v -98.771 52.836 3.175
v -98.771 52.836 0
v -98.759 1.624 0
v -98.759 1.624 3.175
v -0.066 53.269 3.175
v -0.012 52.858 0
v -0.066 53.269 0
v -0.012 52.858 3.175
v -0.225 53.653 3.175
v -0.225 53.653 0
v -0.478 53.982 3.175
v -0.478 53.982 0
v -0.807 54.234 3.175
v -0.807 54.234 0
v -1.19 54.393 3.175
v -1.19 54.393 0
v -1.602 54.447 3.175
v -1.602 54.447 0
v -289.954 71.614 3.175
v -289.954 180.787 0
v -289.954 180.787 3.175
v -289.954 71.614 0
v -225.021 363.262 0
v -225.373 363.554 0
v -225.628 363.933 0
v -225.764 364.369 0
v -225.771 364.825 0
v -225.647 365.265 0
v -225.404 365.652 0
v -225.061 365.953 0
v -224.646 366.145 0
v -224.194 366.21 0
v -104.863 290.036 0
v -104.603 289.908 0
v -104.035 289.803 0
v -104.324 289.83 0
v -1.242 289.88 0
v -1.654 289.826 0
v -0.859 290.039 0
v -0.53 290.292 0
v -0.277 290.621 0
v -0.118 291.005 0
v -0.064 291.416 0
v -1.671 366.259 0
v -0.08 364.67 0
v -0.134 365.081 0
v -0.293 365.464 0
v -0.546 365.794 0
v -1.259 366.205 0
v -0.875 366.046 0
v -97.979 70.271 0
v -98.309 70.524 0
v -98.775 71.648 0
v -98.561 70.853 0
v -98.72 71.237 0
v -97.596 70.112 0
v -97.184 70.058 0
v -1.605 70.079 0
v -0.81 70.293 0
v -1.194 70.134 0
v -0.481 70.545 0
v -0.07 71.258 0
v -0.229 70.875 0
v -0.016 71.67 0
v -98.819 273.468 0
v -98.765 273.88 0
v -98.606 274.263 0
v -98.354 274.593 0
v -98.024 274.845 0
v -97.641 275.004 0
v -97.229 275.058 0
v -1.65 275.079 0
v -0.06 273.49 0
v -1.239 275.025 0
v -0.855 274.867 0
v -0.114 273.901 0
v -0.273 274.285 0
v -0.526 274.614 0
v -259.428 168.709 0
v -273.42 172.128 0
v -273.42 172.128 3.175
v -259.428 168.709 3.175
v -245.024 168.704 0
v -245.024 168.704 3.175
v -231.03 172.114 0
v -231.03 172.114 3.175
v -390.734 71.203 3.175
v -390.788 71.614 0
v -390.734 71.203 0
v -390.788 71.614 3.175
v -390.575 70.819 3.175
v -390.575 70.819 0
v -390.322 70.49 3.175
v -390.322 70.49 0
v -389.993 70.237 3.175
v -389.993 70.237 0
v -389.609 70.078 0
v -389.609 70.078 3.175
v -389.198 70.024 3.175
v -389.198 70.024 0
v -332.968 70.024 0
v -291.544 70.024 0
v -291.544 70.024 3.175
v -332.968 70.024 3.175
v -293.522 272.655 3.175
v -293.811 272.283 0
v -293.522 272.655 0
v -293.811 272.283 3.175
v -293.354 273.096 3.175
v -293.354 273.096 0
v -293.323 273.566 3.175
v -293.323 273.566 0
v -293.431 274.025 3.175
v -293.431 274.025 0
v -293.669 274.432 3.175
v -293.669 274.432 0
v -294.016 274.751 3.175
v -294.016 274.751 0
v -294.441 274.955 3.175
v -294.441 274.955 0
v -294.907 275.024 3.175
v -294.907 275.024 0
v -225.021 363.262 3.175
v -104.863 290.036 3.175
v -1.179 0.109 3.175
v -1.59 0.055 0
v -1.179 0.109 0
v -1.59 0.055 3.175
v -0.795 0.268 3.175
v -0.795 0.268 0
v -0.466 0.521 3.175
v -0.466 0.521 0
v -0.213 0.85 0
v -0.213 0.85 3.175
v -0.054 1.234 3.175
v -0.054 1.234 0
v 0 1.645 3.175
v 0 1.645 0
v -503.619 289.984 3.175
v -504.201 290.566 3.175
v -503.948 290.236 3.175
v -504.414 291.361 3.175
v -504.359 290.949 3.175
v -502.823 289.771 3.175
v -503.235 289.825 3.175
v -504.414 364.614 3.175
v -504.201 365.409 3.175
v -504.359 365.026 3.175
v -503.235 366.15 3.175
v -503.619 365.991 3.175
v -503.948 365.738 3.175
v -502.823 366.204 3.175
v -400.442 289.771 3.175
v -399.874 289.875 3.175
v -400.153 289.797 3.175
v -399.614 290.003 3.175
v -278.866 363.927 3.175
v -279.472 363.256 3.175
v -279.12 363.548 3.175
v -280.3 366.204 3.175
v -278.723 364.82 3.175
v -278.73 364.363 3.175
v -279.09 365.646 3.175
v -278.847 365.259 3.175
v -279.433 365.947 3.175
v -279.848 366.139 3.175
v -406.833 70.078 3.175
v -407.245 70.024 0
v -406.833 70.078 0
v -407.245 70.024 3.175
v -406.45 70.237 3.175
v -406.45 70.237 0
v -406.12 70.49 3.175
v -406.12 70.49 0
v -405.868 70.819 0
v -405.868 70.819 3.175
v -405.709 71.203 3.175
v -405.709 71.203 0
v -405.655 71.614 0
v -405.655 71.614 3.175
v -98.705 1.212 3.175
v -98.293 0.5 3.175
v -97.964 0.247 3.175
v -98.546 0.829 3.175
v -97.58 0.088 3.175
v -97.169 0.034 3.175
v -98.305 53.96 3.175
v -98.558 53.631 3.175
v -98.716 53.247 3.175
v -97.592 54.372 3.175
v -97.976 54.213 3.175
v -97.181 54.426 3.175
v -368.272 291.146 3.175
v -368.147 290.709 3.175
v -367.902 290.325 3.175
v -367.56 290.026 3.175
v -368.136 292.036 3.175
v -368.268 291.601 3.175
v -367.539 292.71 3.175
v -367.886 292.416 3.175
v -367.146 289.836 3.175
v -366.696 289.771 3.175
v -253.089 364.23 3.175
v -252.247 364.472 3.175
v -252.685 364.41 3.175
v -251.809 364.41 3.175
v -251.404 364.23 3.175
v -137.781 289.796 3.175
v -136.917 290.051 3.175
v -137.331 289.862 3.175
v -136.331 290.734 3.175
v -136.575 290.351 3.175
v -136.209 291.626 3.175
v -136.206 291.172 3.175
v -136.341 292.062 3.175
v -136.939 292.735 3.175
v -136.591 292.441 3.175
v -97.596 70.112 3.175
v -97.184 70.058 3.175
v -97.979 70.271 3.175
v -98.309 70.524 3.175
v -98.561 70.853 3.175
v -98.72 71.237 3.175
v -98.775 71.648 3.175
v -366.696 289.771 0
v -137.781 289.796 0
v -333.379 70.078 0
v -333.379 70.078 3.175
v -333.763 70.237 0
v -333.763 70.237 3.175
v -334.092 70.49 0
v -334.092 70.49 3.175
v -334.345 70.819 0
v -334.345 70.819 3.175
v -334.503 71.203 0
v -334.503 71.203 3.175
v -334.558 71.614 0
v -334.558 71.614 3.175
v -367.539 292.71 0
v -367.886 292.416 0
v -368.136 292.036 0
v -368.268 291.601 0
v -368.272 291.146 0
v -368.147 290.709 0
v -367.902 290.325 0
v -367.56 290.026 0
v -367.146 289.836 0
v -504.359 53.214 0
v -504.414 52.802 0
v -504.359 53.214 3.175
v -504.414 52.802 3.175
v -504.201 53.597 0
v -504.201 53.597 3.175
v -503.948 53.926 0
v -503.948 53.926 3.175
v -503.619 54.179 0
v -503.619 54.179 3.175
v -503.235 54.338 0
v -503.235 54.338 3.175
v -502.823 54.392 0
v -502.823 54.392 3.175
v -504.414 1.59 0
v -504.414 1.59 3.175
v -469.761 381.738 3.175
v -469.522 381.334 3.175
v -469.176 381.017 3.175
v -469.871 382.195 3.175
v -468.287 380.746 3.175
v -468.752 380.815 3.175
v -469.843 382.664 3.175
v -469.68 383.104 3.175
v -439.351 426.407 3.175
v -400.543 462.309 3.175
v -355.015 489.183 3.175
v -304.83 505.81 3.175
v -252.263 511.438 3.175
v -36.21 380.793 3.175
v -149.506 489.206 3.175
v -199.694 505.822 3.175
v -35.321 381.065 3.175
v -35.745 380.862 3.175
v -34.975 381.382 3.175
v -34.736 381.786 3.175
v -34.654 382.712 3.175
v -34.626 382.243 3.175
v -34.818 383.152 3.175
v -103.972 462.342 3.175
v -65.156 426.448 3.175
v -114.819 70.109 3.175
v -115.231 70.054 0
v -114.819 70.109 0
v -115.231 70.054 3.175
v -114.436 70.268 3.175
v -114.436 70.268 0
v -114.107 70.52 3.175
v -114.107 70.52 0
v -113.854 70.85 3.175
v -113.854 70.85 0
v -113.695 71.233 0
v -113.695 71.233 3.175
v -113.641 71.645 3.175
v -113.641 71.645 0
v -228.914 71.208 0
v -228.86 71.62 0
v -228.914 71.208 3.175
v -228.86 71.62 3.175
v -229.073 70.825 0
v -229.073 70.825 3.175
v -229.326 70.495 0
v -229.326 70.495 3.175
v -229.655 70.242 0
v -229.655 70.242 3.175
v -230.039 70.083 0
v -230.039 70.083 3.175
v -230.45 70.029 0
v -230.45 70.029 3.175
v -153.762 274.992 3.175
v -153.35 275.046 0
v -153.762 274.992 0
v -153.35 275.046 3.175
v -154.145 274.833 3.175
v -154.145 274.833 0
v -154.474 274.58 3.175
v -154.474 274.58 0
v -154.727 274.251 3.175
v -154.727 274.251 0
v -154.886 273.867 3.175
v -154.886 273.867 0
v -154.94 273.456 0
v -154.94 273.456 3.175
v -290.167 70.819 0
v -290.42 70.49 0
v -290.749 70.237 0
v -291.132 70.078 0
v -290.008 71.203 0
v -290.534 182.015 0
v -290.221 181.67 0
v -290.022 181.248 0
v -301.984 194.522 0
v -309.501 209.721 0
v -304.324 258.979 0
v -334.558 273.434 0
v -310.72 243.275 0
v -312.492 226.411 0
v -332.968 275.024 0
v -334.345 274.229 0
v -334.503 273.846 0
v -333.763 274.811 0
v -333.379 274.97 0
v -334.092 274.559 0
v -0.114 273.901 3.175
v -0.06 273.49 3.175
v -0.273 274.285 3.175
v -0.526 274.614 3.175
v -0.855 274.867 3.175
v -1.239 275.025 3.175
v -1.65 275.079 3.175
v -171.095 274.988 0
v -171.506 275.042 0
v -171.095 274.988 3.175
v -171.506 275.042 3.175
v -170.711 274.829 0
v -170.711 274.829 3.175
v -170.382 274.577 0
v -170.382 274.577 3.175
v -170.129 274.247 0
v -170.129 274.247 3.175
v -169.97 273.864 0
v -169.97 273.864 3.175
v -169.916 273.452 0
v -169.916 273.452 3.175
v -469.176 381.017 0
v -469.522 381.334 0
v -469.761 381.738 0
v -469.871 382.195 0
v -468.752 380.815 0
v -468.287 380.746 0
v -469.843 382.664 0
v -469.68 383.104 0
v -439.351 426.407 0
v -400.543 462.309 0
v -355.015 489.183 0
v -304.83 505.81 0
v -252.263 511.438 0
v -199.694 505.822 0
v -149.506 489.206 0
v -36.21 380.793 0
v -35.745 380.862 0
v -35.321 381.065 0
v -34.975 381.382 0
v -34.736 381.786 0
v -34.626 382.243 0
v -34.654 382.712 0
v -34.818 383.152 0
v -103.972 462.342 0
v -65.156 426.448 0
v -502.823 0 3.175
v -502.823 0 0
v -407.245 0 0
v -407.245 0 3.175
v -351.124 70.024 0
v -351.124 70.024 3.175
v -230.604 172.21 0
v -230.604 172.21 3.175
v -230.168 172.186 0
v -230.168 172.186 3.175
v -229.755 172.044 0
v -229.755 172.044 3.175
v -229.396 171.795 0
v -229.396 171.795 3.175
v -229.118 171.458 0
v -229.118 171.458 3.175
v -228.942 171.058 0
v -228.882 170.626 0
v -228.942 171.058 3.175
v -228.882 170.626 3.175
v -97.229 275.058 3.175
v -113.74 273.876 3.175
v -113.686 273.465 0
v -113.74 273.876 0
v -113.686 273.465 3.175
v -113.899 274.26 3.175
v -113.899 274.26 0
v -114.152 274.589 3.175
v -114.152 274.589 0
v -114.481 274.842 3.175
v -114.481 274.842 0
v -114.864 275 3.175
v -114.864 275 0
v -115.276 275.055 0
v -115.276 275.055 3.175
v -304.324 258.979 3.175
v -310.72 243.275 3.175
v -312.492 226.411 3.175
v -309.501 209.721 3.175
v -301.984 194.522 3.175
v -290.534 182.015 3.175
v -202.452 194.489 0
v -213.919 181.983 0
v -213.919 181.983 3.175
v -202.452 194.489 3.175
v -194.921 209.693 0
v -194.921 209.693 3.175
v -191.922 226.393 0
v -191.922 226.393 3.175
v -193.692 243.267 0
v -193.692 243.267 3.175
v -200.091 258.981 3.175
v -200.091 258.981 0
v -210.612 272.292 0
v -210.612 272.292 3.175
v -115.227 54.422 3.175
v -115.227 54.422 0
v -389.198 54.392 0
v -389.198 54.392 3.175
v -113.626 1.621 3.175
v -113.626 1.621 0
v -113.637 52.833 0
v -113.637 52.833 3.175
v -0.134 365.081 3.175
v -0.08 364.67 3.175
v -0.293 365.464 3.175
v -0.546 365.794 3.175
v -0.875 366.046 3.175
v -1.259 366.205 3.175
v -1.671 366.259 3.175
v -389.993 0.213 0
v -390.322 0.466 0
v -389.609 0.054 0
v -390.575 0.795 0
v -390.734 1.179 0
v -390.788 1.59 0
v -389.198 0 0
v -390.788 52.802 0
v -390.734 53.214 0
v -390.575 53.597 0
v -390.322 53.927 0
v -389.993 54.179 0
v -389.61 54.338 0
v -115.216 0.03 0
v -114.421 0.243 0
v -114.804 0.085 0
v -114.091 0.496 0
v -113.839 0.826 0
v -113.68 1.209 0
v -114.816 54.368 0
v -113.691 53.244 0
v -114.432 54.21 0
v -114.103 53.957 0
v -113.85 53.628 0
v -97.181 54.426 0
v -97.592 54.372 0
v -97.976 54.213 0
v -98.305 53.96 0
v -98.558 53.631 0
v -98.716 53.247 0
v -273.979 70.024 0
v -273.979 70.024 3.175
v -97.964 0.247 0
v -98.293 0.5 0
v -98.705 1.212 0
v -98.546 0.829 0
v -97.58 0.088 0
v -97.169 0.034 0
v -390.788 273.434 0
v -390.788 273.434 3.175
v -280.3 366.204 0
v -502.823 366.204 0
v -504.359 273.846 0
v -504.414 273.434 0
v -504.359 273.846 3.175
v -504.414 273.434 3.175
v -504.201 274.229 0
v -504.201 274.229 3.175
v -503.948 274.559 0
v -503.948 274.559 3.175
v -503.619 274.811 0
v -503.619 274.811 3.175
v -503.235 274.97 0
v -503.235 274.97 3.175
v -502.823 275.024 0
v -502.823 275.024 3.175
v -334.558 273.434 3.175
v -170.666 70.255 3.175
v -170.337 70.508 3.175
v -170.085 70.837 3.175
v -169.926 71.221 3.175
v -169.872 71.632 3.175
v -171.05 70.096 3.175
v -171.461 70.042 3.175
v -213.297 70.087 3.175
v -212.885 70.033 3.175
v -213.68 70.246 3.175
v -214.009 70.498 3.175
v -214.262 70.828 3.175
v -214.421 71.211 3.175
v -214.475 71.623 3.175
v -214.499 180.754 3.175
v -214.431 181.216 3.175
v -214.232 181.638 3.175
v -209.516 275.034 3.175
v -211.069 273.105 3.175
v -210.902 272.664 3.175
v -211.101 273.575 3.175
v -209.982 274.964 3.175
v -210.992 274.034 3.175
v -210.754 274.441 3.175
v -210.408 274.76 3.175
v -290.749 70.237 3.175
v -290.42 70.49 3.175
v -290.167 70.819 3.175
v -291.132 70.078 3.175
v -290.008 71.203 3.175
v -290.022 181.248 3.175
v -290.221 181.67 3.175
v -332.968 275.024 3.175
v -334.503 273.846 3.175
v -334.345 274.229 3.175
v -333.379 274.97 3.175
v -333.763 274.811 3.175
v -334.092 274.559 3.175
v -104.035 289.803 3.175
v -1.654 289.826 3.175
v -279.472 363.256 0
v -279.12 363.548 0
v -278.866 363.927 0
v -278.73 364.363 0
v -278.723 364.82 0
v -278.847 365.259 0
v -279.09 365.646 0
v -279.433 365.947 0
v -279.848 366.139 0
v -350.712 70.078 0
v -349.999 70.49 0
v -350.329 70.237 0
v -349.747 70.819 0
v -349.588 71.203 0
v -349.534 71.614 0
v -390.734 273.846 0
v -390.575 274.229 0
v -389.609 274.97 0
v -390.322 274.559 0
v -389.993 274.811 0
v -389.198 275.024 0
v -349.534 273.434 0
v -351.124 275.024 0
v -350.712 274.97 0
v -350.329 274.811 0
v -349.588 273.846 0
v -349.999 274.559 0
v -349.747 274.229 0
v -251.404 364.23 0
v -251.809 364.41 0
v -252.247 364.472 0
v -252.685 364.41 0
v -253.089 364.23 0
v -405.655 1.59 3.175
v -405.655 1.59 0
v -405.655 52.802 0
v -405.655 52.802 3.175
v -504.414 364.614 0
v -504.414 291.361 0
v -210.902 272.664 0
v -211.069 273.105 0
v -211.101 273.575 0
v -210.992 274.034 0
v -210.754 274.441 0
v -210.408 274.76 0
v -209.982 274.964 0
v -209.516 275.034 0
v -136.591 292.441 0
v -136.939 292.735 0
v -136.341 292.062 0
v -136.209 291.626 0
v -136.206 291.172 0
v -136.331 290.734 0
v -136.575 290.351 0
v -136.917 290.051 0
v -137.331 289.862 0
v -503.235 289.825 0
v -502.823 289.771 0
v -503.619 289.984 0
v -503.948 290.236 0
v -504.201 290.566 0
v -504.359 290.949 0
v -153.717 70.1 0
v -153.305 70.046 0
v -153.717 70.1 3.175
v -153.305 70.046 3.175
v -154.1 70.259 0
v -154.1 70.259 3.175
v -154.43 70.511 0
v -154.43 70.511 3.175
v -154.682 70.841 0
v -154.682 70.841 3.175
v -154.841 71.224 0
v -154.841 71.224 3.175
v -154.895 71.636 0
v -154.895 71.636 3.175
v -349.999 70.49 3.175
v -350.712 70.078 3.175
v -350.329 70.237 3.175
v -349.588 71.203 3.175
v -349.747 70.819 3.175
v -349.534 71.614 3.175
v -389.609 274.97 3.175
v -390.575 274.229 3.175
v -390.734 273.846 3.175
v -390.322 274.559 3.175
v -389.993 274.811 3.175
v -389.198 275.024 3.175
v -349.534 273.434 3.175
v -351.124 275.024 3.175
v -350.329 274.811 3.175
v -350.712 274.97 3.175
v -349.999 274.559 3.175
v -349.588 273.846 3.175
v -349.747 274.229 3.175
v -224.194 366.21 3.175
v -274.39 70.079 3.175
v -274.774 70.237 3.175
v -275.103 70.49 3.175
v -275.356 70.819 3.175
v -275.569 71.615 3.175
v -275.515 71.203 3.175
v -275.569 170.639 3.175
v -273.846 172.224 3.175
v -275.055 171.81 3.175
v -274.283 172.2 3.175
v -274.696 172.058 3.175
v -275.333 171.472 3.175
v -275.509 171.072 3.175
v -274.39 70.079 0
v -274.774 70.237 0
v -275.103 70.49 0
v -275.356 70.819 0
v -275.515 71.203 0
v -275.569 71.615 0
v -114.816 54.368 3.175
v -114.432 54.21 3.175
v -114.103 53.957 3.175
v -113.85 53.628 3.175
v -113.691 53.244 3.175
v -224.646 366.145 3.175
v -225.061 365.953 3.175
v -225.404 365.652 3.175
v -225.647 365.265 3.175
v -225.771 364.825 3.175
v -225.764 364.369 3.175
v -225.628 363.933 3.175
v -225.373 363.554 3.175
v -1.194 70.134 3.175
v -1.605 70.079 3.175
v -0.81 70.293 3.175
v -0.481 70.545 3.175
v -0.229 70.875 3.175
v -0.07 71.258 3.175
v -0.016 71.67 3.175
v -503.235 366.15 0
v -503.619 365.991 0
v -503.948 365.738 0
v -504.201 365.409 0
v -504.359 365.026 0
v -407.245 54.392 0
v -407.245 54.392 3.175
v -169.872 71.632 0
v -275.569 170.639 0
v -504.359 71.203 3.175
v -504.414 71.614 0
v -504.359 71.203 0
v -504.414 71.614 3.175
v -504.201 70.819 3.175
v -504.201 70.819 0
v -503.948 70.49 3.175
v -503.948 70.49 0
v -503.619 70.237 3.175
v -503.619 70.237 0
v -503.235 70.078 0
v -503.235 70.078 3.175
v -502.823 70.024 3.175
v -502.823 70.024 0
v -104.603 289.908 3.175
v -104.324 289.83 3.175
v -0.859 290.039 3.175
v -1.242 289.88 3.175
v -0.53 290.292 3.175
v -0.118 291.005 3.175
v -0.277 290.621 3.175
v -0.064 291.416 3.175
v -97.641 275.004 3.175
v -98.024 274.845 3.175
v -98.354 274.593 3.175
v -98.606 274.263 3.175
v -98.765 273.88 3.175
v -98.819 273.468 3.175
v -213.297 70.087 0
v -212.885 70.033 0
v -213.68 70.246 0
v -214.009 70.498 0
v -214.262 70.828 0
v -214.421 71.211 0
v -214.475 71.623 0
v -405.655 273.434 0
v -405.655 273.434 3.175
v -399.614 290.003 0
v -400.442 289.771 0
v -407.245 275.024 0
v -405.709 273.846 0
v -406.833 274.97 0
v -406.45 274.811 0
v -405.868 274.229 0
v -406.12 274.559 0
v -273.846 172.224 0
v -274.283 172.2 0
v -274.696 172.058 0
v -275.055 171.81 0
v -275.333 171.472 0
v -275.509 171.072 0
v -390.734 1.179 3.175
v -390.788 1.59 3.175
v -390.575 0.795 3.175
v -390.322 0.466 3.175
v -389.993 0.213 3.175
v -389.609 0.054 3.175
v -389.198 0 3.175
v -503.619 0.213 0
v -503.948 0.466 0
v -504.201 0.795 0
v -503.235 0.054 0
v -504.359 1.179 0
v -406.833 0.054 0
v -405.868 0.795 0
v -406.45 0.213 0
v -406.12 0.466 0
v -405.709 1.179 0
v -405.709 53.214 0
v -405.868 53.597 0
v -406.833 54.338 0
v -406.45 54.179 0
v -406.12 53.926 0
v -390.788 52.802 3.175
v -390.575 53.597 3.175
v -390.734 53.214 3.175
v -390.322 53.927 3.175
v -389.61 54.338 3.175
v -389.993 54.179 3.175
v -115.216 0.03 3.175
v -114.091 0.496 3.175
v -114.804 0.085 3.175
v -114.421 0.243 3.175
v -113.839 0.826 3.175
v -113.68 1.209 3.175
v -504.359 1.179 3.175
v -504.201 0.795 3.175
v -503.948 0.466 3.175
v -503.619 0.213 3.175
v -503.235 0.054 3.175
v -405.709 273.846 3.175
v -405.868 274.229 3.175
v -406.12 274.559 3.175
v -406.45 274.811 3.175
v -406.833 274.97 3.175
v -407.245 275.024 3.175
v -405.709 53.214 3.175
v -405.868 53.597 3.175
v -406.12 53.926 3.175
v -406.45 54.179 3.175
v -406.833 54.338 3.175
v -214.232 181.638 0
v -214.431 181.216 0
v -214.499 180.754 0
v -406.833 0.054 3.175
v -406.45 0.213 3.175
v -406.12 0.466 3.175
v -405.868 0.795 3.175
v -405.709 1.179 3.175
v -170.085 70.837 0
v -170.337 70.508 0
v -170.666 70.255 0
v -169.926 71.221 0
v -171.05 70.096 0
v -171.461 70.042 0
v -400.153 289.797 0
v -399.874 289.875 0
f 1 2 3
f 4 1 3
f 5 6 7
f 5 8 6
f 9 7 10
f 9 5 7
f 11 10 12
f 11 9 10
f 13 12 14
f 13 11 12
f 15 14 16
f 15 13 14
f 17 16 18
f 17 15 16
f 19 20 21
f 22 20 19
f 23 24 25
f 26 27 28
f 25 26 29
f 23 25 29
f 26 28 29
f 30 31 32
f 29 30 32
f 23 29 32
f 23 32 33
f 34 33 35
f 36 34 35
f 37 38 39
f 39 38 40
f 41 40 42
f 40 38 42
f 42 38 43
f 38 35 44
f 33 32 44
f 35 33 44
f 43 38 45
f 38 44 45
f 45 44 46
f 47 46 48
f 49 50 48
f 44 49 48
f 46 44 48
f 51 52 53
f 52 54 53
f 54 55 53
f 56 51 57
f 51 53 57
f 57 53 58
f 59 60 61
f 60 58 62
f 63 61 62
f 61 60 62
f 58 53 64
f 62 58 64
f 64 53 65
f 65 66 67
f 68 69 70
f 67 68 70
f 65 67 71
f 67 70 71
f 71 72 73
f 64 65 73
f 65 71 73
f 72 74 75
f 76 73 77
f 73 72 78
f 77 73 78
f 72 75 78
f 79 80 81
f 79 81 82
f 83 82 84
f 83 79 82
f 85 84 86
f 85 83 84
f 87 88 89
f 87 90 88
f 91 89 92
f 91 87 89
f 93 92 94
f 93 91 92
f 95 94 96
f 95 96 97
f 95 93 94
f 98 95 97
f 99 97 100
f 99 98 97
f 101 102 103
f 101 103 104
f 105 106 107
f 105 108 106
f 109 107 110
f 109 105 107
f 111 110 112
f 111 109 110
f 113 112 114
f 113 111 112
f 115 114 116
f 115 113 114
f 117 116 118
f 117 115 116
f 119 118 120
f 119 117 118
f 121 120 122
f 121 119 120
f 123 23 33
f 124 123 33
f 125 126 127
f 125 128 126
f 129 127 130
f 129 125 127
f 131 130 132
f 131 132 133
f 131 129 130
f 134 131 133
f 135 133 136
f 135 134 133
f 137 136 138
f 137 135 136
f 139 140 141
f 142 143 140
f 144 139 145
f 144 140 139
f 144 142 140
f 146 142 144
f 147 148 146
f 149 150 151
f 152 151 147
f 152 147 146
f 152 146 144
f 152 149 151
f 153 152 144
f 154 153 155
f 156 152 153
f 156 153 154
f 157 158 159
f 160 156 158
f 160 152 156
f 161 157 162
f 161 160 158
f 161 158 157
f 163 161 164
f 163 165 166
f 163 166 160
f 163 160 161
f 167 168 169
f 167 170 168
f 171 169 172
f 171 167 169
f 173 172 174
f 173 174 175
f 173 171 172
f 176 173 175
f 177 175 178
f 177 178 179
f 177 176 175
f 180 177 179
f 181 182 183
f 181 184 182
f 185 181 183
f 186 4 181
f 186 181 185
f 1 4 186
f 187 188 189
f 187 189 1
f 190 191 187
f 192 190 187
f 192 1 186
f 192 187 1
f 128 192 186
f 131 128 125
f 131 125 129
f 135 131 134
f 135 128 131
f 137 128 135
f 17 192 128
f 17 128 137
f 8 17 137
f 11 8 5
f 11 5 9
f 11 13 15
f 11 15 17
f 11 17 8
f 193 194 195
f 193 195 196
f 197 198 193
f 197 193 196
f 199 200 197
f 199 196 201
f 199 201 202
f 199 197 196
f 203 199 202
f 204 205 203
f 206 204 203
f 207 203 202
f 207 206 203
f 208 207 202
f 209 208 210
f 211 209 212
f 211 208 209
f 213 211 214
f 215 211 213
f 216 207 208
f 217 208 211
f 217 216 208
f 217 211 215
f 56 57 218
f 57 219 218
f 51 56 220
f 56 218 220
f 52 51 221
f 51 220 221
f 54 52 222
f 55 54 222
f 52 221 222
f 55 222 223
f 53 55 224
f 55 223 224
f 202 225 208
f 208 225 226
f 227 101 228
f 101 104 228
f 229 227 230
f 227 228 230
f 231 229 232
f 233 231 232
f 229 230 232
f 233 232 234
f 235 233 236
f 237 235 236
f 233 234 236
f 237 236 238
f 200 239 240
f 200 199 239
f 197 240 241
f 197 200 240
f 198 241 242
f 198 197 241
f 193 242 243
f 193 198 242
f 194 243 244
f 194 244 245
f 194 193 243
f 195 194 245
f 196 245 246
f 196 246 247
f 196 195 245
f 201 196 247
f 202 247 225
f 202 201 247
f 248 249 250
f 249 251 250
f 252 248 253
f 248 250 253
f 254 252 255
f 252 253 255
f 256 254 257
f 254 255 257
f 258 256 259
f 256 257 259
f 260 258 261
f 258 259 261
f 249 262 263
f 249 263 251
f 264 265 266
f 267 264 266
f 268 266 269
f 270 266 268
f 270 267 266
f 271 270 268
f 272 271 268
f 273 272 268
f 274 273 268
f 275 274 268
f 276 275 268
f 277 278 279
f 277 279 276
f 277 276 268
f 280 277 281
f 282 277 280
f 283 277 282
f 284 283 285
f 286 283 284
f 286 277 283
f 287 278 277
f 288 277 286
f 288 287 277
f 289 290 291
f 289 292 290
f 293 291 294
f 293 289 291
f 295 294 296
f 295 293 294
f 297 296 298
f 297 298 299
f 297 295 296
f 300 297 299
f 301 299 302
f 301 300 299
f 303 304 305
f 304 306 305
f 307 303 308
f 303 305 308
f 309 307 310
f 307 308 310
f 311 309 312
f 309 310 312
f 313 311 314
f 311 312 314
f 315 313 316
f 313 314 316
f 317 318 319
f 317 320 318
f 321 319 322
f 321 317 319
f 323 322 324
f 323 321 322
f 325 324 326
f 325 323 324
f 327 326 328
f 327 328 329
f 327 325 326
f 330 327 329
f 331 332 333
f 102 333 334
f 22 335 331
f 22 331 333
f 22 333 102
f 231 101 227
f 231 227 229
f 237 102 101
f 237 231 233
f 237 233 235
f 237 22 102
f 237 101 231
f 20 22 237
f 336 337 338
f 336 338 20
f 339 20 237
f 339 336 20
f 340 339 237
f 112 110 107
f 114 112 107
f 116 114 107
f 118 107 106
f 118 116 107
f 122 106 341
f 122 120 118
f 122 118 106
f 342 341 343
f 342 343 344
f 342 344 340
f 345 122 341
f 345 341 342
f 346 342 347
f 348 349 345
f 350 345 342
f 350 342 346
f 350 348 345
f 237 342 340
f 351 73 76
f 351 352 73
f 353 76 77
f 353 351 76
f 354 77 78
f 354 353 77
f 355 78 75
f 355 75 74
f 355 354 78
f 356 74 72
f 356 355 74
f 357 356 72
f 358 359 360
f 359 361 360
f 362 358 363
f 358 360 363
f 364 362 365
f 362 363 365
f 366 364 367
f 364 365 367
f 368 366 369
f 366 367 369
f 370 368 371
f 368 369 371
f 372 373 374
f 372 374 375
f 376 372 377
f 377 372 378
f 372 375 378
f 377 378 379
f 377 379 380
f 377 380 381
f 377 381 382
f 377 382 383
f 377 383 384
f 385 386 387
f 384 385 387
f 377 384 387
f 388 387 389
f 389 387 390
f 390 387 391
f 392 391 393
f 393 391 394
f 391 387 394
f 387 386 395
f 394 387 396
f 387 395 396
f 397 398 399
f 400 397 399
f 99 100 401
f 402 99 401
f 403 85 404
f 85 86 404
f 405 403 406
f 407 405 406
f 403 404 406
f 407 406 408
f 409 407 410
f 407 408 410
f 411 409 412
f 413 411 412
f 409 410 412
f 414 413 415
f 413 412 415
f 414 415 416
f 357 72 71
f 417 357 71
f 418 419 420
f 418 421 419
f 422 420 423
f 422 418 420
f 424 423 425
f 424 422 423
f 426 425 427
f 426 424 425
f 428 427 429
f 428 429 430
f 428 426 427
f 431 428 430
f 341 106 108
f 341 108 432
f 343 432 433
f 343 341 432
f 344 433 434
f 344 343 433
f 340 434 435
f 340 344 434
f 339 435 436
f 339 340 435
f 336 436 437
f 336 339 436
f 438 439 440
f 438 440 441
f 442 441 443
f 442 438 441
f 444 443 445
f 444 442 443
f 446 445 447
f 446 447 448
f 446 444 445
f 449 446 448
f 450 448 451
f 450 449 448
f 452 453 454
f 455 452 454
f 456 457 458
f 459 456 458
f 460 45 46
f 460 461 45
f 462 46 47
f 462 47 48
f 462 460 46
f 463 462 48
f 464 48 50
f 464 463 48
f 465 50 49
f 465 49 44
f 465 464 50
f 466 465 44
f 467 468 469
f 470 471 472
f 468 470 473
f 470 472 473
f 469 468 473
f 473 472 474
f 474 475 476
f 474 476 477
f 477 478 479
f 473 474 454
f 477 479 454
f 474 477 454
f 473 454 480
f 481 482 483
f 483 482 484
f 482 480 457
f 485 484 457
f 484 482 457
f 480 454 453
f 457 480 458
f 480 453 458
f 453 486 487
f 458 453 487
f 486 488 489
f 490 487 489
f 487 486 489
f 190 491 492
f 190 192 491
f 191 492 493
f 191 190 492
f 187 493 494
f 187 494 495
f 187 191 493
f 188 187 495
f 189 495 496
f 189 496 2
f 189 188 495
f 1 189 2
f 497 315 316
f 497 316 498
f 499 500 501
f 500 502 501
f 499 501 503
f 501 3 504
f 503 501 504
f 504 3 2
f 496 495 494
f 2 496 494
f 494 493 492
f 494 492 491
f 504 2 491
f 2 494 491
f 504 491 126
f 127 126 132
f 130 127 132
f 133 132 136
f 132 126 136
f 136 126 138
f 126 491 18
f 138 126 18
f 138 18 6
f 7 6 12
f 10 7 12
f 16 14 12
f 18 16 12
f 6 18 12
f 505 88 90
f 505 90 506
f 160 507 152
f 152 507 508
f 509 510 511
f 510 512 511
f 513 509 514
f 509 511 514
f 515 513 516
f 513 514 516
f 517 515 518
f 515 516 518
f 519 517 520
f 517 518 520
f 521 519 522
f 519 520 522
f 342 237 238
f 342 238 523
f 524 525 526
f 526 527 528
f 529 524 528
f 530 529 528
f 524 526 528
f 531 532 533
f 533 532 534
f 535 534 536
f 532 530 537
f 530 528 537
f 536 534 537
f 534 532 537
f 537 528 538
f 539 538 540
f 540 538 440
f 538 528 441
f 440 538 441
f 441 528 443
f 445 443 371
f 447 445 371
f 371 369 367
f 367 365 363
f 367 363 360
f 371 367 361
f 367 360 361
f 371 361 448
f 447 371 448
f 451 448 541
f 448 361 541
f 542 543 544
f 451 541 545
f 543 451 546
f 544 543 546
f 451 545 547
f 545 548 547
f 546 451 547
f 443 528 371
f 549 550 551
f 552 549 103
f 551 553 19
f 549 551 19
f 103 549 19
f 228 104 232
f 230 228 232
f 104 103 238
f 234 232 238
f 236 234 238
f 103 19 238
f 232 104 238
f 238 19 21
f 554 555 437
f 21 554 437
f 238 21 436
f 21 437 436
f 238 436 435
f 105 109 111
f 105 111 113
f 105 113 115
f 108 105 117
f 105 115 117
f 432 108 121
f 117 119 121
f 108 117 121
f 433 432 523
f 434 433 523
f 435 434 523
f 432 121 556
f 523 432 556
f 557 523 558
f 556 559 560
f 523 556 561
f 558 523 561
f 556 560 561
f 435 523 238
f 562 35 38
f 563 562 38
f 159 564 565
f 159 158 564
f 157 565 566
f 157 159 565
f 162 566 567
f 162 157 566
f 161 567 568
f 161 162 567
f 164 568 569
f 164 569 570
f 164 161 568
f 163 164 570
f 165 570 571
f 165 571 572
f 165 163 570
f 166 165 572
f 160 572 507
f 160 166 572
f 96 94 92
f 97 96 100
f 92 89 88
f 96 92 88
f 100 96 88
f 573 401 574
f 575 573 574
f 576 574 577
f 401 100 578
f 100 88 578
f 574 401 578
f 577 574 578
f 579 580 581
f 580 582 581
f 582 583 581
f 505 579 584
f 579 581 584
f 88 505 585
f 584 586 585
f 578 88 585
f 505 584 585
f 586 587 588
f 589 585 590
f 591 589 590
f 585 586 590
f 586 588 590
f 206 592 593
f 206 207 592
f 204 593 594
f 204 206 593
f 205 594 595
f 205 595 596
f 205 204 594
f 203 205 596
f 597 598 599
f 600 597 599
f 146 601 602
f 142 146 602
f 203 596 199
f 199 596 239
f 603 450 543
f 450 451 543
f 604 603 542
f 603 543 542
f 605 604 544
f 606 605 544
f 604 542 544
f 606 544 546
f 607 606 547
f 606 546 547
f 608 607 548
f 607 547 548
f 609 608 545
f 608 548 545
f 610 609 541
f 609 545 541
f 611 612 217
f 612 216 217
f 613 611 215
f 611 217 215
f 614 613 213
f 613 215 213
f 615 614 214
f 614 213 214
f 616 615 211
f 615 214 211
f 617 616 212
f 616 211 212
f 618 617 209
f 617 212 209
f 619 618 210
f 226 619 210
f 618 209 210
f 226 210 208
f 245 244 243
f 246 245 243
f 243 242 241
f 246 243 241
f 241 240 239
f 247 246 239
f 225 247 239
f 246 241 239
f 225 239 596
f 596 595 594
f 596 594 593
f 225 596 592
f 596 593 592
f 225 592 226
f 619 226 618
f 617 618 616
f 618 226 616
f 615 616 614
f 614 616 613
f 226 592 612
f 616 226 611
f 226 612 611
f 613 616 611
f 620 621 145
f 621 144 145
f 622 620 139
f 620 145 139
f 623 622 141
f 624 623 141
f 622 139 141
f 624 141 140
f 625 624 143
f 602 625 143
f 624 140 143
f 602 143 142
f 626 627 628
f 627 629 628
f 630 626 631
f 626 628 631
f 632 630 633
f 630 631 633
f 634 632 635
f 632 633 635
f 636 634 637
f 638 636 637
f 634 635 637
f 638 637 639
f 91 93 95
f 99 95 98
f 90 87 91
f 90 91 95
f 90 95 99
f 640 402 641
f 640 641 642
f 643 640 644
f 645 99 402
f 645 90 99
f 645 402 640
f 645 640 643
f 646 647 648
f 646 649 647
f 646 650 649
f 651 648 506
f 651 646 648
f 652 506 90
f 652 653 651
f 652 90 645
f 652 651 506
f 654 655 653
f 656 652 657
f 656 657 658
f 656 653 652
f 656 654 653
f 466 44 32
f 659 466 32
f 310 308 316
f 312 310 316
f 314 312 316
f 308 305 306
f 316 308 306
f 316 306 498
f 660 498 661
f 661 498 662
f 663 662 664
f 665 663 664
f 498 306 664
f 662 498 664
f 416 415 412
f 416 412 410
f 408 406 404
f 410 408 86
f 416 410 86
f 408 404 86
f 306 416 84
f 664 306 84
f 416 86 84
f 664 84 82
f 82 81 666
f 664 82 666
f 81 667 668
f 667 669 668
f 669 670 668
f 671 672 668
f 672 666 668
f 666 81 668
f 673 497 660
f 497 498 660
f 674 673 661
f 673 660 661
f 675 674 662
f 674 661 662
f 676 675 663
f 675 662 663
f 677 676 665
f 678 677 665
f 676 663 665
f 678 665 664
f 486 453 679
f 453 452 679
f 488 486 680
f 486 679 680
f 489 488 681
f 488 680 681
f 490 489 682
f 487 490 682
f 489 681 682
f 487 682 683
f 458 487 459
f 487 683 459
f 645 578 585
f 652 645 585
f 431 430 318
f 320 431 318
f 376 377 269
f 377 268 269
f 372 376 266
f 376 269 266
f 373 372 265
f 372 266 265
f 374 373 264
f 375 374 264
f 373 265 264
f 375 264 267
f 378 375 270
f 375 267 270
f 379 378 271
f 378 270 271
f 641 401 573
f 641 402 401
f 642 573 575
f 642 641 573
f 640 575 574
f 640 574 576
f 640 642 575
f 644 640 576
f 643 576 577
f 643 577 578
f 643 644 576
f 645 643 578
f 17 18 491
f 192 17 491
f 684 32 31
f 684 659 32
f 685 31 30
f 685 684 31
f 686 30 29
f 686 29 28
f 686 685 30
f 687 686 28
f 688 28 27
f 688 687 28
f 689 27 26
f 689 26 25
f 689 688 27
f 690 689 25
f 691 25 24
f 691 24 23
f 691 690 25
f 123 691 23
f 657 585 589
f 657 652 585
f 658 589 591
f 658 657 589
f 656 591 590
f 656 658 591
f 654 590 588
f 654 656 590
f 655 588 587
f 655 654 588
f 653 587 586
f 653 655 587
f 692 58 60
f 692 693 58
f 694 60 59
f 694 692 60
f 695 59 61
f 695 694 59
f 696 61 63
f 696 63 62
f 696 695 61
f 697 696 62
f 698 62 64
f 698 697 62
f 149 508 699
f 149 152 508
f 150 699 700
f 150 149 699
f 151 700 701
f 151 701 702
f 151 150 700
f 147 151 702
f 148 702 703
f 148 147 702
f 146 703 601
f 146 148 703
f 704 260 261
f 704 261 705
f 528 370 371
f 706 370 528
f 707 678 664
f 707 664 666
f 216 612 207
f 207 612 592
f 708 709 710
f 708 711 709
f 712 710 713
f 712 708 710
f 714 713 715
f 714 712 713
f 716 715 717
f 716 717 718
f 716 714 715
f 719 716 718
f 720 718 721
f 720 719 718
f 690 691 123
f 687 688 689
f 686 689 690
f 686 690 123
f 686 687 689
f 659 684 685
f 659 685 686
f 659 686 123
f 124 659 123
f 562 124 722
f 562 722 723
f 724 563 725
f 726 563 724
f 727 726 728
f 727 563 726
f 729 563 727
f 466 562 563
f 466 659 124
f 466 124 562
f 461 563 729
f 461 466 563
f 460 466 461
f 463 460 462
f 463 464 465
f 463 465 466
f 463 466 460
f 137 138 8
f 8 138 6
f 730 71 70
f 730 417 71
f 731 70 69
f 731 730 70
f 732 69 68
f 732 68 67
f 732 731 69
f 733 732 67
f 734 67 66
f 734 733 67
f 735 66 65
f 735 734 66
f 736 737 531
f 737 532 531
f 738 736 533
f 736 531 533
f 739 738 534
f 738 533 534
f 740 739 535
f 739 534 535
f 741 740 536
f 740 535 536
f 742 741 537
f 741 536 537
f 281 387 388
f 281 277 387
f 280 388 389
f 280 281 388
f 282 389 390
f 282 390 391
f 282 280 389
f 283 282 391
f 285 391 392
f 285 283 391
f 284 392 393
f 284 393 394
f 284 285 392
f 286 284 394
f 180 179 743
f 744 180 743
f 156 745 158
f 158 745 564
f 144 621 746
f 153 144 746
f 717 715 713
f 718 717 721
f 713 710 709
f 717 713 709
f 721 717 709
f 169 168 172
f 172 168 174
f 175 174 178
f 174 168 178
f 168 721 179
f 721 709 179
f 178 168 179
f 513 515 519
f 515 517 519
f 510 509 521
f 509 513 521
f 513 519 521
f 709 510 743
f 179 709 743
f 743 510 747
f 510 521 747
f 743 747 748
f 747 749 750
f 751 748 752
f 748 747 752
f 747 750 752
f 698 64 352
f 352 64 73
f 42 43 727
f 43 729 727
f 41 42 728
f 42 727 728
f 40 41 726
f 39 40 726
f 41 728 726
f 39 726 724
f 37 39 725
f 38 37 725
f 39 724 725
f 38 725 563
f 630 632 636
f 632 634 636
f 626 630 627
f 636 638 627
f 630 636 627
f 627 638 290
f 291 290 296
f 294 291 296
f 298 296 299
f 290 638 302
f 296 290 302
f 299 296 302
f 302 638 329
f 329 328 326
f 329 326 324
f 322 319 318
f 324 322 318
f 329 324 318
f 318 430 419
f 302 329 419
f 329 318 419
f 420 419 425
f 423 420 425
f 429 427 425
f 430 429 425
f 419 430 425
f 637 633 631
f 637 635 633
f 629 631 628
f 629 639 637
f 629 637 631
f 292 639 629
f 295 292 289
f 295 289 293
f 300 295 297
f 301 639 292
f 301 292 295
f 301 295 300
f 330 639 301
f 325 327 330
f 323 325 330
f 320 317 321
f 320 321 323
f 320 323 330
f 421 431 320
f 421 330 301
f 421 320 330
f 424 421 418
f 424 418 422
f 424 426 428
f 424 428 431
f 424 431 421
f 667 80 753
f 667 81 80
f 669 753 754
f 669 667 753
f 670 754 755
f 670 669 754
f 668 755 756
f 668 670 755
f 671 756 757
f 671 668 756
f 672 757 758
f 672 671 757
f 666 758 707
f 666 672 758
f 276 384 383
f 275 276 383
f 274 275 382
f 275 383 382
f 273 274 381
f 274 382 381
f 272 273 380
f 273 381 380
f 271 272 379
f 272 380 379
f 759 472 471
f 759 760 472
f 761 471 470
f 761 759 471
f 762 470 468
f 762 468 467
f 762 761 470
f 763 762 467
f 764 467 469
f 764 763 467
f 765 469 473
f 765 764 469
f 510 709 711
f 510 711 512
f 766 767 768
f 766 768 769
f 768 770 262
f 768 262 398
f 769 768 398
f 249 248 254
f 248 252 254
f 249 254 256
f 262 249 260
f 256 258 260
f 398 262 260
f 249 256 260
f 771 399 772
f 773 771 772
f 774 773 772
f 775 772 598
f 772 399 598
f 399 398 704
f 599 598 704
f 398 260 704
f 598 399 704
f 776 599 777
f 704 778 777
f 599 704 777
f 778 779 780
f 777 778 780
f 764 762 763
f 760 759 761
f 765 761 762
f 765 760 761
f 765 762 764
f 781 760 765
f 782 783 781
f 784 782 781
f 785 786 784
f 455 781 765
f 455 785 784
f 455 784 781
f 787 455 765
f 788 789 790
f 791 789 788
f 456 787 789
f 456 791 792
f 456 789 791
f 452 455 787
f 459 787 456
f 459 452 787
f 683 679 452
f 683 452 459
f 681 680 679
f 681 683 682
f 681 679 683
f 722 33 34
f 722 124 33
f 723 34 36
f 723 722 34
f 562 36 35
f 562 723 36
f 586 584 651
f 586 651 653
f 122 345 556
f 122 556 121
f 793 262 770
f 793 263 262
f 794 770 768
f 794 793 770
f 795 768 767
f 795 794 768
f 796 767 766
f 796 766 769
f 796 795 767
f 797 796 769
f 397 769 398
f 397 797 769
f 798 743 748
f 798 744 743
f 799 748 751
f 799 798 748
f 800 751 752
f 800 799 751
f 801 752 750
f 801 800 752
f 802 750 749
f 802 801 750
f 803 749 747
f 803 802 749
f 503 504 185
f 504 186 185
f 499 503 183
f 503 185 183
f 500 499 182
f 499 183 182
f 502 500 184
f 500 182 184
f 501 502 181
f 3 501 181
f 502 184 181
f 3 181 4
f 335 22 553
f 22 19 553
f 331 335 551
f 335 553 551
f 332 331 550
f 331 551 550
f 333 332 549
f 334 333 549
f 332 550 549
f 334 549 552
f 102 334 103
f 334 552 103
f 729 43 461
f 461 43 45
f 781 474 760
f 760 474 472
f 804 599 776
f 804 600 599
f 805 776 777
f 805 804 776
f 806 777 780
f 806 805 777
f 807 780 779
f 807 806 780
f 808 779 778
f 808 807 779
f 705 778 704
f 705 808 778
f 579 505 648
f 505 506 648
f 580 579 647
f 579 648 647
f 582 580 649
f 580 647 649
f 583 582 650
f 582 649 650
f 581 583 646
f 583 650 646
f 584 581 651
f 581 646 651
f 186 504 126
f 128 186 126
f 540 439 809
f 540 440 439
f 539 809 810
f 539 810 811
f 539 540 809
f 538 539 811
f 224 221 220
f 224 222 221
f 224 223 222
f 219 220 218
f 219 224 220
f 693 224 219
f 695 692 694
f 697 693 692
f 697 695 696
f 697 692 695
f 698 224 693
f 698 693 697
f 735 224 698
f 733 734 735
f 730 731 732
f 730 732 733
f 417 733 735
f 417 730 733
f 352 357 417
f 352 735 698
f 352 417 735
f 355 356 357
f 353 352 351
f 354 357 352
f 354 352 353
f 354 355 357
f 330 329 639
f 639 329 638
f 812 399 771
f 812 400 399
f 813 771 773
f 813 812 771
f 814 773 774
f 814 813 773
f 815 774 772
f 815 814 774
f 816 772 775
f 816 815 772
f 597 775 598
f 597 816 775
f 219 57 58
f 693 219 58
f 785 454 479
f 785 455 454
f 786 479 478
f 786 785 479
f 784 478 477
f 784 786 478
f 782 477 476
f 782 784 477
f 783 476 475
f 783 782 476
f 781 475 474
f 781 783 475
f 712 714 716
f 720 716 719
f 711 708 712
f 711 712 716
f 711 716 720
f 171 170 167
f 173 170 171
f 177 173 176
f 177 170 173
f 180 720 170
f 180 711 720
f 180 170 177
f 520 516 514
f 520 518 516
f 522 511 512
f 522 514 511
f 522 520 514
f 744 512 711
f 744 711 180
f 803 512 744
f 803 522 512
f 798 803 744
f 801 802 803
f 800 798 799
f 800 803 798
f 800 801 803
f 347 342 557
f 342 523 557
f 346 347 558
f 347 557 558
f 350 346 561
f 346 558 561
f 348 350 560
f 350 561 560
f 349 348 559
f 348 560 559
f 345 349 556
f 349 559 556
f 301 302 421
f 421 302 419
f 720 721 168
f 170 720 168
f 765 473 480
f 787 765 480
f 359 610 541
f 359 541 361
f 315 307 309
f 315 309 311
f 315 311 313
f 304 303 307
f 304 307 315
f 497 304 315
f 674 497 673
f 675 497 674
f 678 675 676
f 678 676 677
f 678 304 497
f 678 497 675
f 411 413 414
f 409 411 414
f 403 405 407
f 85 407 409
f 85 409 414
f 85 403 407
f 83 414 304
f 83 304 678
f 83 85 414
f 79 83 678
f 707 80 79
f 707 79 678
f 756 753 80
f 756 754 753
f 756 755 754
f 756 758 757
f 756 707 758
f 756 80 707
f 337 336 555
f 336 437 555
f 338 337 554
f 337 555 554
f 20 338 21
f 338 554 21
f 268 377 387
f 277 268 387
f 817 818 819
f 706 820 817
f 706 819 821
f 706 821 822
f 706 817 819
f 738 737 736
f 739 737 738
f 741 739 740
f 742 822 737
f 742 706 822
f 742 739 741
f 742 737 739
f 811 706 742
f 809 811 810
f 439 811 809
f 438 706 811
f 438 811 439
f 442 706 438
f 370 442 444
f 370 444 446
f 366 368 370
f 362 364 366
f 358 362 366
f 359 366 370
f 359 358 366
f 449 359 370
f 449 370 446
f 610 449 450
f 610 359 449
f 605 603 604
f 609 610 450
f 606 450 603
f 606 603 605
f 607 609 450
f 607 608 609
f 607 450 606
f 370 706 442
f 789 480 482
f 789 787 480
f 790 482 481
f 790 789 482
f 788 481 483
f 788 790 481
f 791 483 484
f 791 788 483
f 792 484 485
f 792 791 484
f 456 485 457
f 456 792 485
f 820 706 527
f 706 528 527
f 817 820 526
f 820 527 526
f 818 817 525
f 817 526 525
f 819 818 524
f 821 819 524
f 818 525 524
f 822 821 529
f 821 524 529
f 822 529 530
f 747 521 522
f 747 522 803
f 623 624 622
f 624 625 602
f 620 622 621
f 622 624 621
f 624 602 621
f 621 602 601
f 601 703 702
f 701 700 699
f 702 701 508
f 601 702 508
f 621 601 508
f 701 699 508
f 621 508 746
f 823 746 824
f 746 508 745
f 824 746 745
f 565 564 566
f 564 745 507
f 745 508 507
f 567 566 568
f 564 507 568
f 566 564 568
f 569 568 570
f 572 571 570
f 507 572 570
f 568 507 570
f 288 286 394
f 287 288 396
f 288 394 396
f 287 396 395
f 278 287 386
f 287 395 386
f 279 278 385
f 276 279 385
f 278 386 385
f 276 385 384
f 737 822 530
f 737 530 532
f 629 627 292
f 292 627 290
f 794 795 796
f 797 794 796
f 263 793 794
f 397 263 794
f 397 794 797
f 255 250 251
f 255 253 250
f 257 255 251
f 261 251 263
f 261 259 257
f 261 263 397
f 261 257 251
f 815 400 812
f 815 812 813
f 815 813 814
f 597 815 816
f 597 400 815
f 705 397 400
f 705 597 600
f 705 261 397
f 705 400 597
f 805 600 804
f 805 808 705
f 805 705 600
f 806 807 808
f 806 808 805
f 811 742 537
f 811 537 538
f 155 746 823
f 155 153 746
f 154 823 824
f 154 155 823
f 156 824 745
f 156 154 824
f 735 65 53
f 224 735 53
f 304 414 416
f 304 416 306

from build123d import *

# Parameters (mm, degrees)
SKETCH1_W              = 98.758926402
SKETCH1_H              = 54.392174278
BOSS_EXTRUDE1_DEPTH    = 3.175
SKETCH1_H_2            = 205.000109937
BOSS_EXTRUDE1_2_DEPTH  = 3.175
BOSS_EXTRUDE1_3_DEPTH  = 3.175
BOSS_EXTRUDE1_4_DEPTH  = 3.175
BOSS_EXTRUDE1_5_DEPTH  = 3.175
BOSS_EXTRUDE1_6_DEPTH  = 3.175
BOSS_EXTRUDE1_7_DEPTH  = 3.175
BOSS_EXTRUDE1_8_DEPTH  = 3.175
BOSS_EXTRUDE1_9_DEPTH  = 3.175
BOSS_EXTRUDE1_10_DEPTH = 3.175
BOSS_EXTRUDE1_11_DEPTH = 3.175
BOSS_EXTRUDE1_12_DEPTH = 3.175
BOSS_EXTRUDE1_13_DEPTH = 3.175
SKETCH1_W_2            = 41.254229691
BOSS_EXTRUDE1_14_DEPTH = 3.175
FILLET1_R              = 1.59004
FILLET2_R              = 1.59004
FILLET3_R              = 1.59004
FILLET4_R              = 1.59004
FILLET5_R              = 1.59004
FILLET6_R              = 1.59004
FILLET7_R              = 1.59004
FILLET8_R              = 1.59004
FILLET9_R              = 1.59004
FILLET10_R             = 1.59004
FILLET11_R             = 1.59004
FILLET12_R             = 1.59004
FILLET13_R             = 1.59004
FILLET14_R             = 1.59004


with BuildPart() as part:
    # Sketch1 → Boss-Extrude1 (new body)
    with BuildSketch(Plane.XY):
        with Locations((-455.034071493, 27.196087139)):
            Rectangle(SKETCH1_W, SKETCH1_H)
    extrude(amount=BOSS_EXTRUDE1_DEPTH)

    # Fillet6
    fillet6_edges = [part.edges().sort_by_distance(p)[0] for p in [
        (-405.654608292, 0, 1.5875),
        (-504.413534694, 0, 1.5875),
        (-504.413534694, 54.392174278, 1.5875),
        (-405.654608292, 54.392174278, 1.5875),
    ]]
    fillet(fillet6_edges, radius=FILLET6_R)


with BuildPart() as body_2:
    # Sketch1 → Boss-Extrude1 2 (new body)
    with BuildSketch(Plane.XY):
        with Locations((-455.034071493, 172.524349147)):
            Rectangle(SKETCH1_W, SKETCH1_H_2)
    extrude(amount=BOSS_EXTRUDE1_2_DEPTH)

    # Fillet5
    fillet5_edges = [body_2.edges().sort_by_distance(p)[0] for p in [
        (-405.654608292, 70.024294178, 1.5875),
        (-504.413534694, 70.024294178, 1.5875),
        (-504.413534694, 275.024404115, 1.5875),
        (-405.654608292, 275.024404115, 1.5875),
    ]]
    fillet(fillet5_edges, radius=FILLET5_R)


with BuildPart() as body_3:
    # Sketch1 → Boss-Extrude1 3 (new body)
    with BuildSketch(Plane.XY):
        Polygon((-504.413534694, 289.770723971), (-399.995536142, 289.770723971), (-274.637603852, 366.204129426), (-504.413534694, 366.204129426), align=None)
    extrude(amount=BOSS_EXTRUDE1_3_DEPTH)

    # Fillet4
    fillet4_edges = [body_3.edges().sort_by_distance(p)[0] for p in [
        (-504.413534694, 289.770723971, 1.5875),
        (-504.413534694, 366.204129426, 1.5875),
        (-274.637603852, 366.204129426, 1.5875),
        (-399.995536142, 289.770723971, 1.5875),
    ]]
    fillet(fillet4_edges, radius=FILLET4_R)


with BuildPart() as body_4:
    # Sketch1 → Boss-Extrude1 4 (new body)
    with BuildSketch(Plane.XY):
        with BuildLine():
            Line((-470.964837705, 380.745219948), (-33.532382457, 380.7932929))
            ThreePointArc((-33.532382457, 380.7932929), (-124.866998496, 476.303277883), (-252.262970294, 511.437814852))
            ThreePointArc((-252.262970294, 511.437814852), (-379.651216585, 476.275277607), (-470.964837705, 380.745219948))
        make_face()
    extrude(amount=BOSS_EXTRUDE1_4_DEPTH)

    # Fillet1
    fillet1_edges = [body_4.edges().sort_by_distance(p)[0] for p in [
        (-470.964837705, 380.745219948, 1.5875),
        (-33.532382457, 380.7932929, 1.5875),
    ]]
    fillet(fillet1_edges, radius=FILLET1_R)


with BuildPart() as body_5:
    # Sketch1 → Boss-Extrude1 5 (new body)
    with BuildSketch(Plane.XY):
        Polygon((-0.063690446, 289.82615101), (-0.080490203, 366.259554619), (-229.856415494, 366.209050789), (-104.481686476, 289.803200352), align=None)
    extrude(amount=BOSS_EXTRUDE1_5_DEPTH)

    # Fillet2
    fillet2_edges = [body_5.edges().sort_by_distance(p)[0] for p in [
        (-0.063690446, 289.82615101, 1.5875),
        (-104.481686476, 289.803200352, 1.5875),
        (-229.856415494, 366.209050789, 1.5875),
        (-0.080490203, 366.259554619, 1.5875),
    ]]
    fillet(fillet2_edges, radius=FILLET2_R)


with BuildPart() as body_6:
    # Sketch1 → Boss-Extrude1 6 (new body)
    with BuildSketch(Plane.XY):
        Polygon((-132.234892816, 289.797100308), (-252.246850325, 364.756625786), (-372.242329131, 289.770723971), align=None)
    extrude(amount=BOSS_EXTRUDE1_6_DEPTH)

    # Fillet3
    fillet3_edges = [body_6.edges().sort_by_distance(p)[0] for p in [
        (-132.234892816, 289.797100308, 1.5875),
        (-372.242329131, 289.770723971, 1.5875),
        (-252.246850325, 364.756625786, 1.5875),
    ]]
    fillet(fillet3_edges, radius=FILLET3_R)


with BuildPart() as body_7:
    # Sketch1 → Boss-Extrude1 7 (new body)
    with BuildSketch(Plane.XY):
        Polygon((-98.774315076, 70.058019709), (-0.01539106, 70.079726526), (-0.060449264, 275.079831511), (-98.81937328, 275.058124694), align=None)
    extrude(amount=BOSS_EXTRUDE1_7_DEPTH)

    # Fillet9
    fillet9_edges = [body_7.edges().sort_by_distance(p)[0] for p in [
        (-98.774315076, 70.058019709, 1.5875),
        (-98.81937328, 275.058124694, 1.5875),
        (-0.060449264, 275.079831511, 1.5875),
        (-0.01539106, 70.079726526, 1.5875),
    ]]
    fillet(fillet9_edges, radius=FILLET9_R)


with BuildPart() as body_8:
    # Sketch1 → Boss-Extrude1 8 (new body)
    with BuildSketch(Plane.XY):
        Polygon((-98.758924016, 0.033727222), (0, 0.055434039), (-0.011955182, 54.447607004), (-98.770879198, 54.425900187), align=None)
    extrude(amount=BOSS_EXTRUDE1_8_DEPTH)

    # Fillet8
    fillet8_edges = [body_8.edges().sort_by_distance(p)[0] for p in [
        (-98.758924016, 0.033727222, 1.5875),
        (-98.770879198, 54.425900187, 1.5875),
        (-0.011955182, 54.447607004, 1.5875),
        (0, 0.055434039, 1.5875),
    ]]
    fillet(fillet8_edges, radius=FILLET8_R)


with BuildPart() as body_9:
    # Sketch1 → Boss-Extrude1 9 (new body)
    with BuildSketch(Plane.XY):
        Polygon((-113.637483376, 54.422632566), (-390.788003755, 54.392174278), (-390.788003755, 0), (-113.625528194, 0.030459602), align=None)
    extrude(amount=BOSS_EXTRUDE1_9_DEPTH)

    # Fillet7
    fillet7_edges = [body_9.edges().sort_by_distance(p)[0] for p in [
        (-113.637483376, 54.422632566, 1.5875),
        (-113.625528194, 0.030459602, 1.5875),
        (-390.788003755, 0, 1.5875),
        (-390.788003755, 54.392174278, 1.5875),
    ]]
    fillet(fillet7_edges, radius=FILLET7_R)


with BuildPart() as body_10:
    # Sketch1 → Boss-Extrude1 10 (new body)
    with BuildSketch(Plane.XY):
        Polygon((-154.895147948, 70.045684574), (-113.640919254, 70.054752089), (-113.685977458, 275.054857074), (-154.940206152, 275.045789559), align=None)
    extrude(amount=BOSS_EXTRUDE1_10_DEPTH)

    # Fillet10
    fillet10_edges = [body_10.edges().sort_by_distance(p)[0] for p in [
        (-154.895147948, 70.045684574, 1.5875),
        (-154.940206152, 275.045789559, 1.5875),
        (-113.685977458, 275.054857074, 1.5875),
        (-113.640919254, 70.054752089, 1.5875),
    ]]
    fillet(fillet10_edges, radius=FILLET10_R)


with BuildPart() as body_11:
    # Sketch1 → Boss-Extrude1 11 (new body)
    with BuildSketch(Plane.XY):
        with BuildLine():
            ThreePointArc((-214.499514867, 181.512114455), (-191.883991823, 228.081593234), (-213.695808519, 275.032875312))
            Line((-213.695808519, 275.032875312), (-169.916399335, 275.042497851))
            Line((-169.916399335, 275.042497851), (-169.87134113, 70.042392867))
            Line((-169.87134113, 70.042392867), (-214.475012112, 70.032589158))
            Line((-214.475012112, 70.032589158), (-214.499514867, 181.512114455))
        make_face()
    extrude(amount=BOSS_EXTRUDE1_11_DEPTH)

    # Fillet11
    fillet11_edges = [body_11.edges().sort_by_distance(p)[0] for p in [
        (-213.695808519, 275.032875312, 1.5875),
        (-169.916399335, 275.042497851, 1.5875),
        (-169.87134113, 70.042392867, 1.5875),
        (-214.475012112, 70.032589158, 1.5875),
        (-214.499514867, 181.512114455, 1.5875),
    ]]
    fillet(fillet11_edges, radius=FILLET11_R)


with BuildPart() as body_12:
    # Sketch1 → Boss-Extrude1 12 (new body)
    with BuildSketch(Plane.XY):
        with BuildLine():
            ThreePointArc((-275.568925666, 172.982421472), (-252.227378583, 168.275003522), (-228.88261971, 172.966467809))
            Line((-228.88261971, 172.966467809), (-228.85999456, 70.029427396))
            Line((-228.85999456, 70.029427396), (-275.568925666, 70.024294178))
            Line((-275.568925666, 70.024294178), (-275.568925666, 172.982421472))
        make_face()
    extrude(amount=BOSS_EXTRUDE1_12_DEPTH)

    # Fillet12
    fillet12_edges = [body_12.edges().sort_by_distance(p)[0] for p in [
        (-228.88261971, 172.966467809, 1.5875),
        (-228.85999456, 70.029427396, 1.5875),
        (-275.568925666, 70.024294178, 1.5875),
        (-275.568925666, 172.982421472, 1.5875),
    ]]
    fillet(fillet12_edges, radius=FILLET12_R)


with BuildPart() as body_13:
    # Sketch1 → Boss-Extrude1 13 (new body)
    with BuildSketch(Plane.XY):
        with BuildLine():
            ThreePointArc((-290.727931568, 275.024404115), (-312.529696482, 228.100522185), (-289.953908461, 181.54408929))
            Line((-289.953908461, 181.54408929), (-289.953908461, 70.024294178))
            Line((-289.953908461, 70.024294178), (-334.55758052, 70.024294178))
            Line((-334.55758052, 70.024294178), (-334.55758052, 275.024404115))
            Line((-334.55758052, 275.024404115), (-290.727931568, 275.024404115))
        make_face()
    extrude(amount=BOSS_EXTRUDE1_13_DEPTH)

    # Fillet13
    fillet13_edges = [body_13.edges().sort_by_distance(p)[0] for p in [
        (-289.953908461, 181.54408929, 1.5875),
        (-289.953908461, 70.024294178, 1.5875),
        (-334.55758052, 70.024294178, 1.5875),
        (-334.55758052, 275.024404115, 1.5875),
        (-290.727931568, 275.024404115, 1.5875),
    ]]
    fillet(fillet13_edges, radius=FILLET13_R)


with BuildPart() as body_14:
    # Sketch1 → Boss-Extrude1 14 (new body)
    with BuildSketch(Plane.XY):
        with Locations((-370.16088891, 172.524349147)):
            Rectangle(SKETCH1_W_2, SKETCH1_H_2)
    extrude(amount=BOSS_EXTRUDE1_14_DEPTH)

    # Fillet14
    fillet14_edges = [body_14.edges().sort_by_distance(p)[0] for p in [
        (-349.533774064, 70.024294178, 1.5875),
        (-390.788003755, 70.024294178, 1.5875),
        (-390.788003755, 275.024404115, 1.5875),
        (-349.533774064, 275.024404115, 1.5875),
    ]]
    fillet(fillet14_edges, radius=FILLET14_R)


solid = Compound([part.part, body_2.part, body_3.part, body_4.part, body_5.part, body_6.part, body_7.part, body_8.part, body_9.part, body_10.part, body_11.part, body_12.part, body_13.part, body_14.part])
